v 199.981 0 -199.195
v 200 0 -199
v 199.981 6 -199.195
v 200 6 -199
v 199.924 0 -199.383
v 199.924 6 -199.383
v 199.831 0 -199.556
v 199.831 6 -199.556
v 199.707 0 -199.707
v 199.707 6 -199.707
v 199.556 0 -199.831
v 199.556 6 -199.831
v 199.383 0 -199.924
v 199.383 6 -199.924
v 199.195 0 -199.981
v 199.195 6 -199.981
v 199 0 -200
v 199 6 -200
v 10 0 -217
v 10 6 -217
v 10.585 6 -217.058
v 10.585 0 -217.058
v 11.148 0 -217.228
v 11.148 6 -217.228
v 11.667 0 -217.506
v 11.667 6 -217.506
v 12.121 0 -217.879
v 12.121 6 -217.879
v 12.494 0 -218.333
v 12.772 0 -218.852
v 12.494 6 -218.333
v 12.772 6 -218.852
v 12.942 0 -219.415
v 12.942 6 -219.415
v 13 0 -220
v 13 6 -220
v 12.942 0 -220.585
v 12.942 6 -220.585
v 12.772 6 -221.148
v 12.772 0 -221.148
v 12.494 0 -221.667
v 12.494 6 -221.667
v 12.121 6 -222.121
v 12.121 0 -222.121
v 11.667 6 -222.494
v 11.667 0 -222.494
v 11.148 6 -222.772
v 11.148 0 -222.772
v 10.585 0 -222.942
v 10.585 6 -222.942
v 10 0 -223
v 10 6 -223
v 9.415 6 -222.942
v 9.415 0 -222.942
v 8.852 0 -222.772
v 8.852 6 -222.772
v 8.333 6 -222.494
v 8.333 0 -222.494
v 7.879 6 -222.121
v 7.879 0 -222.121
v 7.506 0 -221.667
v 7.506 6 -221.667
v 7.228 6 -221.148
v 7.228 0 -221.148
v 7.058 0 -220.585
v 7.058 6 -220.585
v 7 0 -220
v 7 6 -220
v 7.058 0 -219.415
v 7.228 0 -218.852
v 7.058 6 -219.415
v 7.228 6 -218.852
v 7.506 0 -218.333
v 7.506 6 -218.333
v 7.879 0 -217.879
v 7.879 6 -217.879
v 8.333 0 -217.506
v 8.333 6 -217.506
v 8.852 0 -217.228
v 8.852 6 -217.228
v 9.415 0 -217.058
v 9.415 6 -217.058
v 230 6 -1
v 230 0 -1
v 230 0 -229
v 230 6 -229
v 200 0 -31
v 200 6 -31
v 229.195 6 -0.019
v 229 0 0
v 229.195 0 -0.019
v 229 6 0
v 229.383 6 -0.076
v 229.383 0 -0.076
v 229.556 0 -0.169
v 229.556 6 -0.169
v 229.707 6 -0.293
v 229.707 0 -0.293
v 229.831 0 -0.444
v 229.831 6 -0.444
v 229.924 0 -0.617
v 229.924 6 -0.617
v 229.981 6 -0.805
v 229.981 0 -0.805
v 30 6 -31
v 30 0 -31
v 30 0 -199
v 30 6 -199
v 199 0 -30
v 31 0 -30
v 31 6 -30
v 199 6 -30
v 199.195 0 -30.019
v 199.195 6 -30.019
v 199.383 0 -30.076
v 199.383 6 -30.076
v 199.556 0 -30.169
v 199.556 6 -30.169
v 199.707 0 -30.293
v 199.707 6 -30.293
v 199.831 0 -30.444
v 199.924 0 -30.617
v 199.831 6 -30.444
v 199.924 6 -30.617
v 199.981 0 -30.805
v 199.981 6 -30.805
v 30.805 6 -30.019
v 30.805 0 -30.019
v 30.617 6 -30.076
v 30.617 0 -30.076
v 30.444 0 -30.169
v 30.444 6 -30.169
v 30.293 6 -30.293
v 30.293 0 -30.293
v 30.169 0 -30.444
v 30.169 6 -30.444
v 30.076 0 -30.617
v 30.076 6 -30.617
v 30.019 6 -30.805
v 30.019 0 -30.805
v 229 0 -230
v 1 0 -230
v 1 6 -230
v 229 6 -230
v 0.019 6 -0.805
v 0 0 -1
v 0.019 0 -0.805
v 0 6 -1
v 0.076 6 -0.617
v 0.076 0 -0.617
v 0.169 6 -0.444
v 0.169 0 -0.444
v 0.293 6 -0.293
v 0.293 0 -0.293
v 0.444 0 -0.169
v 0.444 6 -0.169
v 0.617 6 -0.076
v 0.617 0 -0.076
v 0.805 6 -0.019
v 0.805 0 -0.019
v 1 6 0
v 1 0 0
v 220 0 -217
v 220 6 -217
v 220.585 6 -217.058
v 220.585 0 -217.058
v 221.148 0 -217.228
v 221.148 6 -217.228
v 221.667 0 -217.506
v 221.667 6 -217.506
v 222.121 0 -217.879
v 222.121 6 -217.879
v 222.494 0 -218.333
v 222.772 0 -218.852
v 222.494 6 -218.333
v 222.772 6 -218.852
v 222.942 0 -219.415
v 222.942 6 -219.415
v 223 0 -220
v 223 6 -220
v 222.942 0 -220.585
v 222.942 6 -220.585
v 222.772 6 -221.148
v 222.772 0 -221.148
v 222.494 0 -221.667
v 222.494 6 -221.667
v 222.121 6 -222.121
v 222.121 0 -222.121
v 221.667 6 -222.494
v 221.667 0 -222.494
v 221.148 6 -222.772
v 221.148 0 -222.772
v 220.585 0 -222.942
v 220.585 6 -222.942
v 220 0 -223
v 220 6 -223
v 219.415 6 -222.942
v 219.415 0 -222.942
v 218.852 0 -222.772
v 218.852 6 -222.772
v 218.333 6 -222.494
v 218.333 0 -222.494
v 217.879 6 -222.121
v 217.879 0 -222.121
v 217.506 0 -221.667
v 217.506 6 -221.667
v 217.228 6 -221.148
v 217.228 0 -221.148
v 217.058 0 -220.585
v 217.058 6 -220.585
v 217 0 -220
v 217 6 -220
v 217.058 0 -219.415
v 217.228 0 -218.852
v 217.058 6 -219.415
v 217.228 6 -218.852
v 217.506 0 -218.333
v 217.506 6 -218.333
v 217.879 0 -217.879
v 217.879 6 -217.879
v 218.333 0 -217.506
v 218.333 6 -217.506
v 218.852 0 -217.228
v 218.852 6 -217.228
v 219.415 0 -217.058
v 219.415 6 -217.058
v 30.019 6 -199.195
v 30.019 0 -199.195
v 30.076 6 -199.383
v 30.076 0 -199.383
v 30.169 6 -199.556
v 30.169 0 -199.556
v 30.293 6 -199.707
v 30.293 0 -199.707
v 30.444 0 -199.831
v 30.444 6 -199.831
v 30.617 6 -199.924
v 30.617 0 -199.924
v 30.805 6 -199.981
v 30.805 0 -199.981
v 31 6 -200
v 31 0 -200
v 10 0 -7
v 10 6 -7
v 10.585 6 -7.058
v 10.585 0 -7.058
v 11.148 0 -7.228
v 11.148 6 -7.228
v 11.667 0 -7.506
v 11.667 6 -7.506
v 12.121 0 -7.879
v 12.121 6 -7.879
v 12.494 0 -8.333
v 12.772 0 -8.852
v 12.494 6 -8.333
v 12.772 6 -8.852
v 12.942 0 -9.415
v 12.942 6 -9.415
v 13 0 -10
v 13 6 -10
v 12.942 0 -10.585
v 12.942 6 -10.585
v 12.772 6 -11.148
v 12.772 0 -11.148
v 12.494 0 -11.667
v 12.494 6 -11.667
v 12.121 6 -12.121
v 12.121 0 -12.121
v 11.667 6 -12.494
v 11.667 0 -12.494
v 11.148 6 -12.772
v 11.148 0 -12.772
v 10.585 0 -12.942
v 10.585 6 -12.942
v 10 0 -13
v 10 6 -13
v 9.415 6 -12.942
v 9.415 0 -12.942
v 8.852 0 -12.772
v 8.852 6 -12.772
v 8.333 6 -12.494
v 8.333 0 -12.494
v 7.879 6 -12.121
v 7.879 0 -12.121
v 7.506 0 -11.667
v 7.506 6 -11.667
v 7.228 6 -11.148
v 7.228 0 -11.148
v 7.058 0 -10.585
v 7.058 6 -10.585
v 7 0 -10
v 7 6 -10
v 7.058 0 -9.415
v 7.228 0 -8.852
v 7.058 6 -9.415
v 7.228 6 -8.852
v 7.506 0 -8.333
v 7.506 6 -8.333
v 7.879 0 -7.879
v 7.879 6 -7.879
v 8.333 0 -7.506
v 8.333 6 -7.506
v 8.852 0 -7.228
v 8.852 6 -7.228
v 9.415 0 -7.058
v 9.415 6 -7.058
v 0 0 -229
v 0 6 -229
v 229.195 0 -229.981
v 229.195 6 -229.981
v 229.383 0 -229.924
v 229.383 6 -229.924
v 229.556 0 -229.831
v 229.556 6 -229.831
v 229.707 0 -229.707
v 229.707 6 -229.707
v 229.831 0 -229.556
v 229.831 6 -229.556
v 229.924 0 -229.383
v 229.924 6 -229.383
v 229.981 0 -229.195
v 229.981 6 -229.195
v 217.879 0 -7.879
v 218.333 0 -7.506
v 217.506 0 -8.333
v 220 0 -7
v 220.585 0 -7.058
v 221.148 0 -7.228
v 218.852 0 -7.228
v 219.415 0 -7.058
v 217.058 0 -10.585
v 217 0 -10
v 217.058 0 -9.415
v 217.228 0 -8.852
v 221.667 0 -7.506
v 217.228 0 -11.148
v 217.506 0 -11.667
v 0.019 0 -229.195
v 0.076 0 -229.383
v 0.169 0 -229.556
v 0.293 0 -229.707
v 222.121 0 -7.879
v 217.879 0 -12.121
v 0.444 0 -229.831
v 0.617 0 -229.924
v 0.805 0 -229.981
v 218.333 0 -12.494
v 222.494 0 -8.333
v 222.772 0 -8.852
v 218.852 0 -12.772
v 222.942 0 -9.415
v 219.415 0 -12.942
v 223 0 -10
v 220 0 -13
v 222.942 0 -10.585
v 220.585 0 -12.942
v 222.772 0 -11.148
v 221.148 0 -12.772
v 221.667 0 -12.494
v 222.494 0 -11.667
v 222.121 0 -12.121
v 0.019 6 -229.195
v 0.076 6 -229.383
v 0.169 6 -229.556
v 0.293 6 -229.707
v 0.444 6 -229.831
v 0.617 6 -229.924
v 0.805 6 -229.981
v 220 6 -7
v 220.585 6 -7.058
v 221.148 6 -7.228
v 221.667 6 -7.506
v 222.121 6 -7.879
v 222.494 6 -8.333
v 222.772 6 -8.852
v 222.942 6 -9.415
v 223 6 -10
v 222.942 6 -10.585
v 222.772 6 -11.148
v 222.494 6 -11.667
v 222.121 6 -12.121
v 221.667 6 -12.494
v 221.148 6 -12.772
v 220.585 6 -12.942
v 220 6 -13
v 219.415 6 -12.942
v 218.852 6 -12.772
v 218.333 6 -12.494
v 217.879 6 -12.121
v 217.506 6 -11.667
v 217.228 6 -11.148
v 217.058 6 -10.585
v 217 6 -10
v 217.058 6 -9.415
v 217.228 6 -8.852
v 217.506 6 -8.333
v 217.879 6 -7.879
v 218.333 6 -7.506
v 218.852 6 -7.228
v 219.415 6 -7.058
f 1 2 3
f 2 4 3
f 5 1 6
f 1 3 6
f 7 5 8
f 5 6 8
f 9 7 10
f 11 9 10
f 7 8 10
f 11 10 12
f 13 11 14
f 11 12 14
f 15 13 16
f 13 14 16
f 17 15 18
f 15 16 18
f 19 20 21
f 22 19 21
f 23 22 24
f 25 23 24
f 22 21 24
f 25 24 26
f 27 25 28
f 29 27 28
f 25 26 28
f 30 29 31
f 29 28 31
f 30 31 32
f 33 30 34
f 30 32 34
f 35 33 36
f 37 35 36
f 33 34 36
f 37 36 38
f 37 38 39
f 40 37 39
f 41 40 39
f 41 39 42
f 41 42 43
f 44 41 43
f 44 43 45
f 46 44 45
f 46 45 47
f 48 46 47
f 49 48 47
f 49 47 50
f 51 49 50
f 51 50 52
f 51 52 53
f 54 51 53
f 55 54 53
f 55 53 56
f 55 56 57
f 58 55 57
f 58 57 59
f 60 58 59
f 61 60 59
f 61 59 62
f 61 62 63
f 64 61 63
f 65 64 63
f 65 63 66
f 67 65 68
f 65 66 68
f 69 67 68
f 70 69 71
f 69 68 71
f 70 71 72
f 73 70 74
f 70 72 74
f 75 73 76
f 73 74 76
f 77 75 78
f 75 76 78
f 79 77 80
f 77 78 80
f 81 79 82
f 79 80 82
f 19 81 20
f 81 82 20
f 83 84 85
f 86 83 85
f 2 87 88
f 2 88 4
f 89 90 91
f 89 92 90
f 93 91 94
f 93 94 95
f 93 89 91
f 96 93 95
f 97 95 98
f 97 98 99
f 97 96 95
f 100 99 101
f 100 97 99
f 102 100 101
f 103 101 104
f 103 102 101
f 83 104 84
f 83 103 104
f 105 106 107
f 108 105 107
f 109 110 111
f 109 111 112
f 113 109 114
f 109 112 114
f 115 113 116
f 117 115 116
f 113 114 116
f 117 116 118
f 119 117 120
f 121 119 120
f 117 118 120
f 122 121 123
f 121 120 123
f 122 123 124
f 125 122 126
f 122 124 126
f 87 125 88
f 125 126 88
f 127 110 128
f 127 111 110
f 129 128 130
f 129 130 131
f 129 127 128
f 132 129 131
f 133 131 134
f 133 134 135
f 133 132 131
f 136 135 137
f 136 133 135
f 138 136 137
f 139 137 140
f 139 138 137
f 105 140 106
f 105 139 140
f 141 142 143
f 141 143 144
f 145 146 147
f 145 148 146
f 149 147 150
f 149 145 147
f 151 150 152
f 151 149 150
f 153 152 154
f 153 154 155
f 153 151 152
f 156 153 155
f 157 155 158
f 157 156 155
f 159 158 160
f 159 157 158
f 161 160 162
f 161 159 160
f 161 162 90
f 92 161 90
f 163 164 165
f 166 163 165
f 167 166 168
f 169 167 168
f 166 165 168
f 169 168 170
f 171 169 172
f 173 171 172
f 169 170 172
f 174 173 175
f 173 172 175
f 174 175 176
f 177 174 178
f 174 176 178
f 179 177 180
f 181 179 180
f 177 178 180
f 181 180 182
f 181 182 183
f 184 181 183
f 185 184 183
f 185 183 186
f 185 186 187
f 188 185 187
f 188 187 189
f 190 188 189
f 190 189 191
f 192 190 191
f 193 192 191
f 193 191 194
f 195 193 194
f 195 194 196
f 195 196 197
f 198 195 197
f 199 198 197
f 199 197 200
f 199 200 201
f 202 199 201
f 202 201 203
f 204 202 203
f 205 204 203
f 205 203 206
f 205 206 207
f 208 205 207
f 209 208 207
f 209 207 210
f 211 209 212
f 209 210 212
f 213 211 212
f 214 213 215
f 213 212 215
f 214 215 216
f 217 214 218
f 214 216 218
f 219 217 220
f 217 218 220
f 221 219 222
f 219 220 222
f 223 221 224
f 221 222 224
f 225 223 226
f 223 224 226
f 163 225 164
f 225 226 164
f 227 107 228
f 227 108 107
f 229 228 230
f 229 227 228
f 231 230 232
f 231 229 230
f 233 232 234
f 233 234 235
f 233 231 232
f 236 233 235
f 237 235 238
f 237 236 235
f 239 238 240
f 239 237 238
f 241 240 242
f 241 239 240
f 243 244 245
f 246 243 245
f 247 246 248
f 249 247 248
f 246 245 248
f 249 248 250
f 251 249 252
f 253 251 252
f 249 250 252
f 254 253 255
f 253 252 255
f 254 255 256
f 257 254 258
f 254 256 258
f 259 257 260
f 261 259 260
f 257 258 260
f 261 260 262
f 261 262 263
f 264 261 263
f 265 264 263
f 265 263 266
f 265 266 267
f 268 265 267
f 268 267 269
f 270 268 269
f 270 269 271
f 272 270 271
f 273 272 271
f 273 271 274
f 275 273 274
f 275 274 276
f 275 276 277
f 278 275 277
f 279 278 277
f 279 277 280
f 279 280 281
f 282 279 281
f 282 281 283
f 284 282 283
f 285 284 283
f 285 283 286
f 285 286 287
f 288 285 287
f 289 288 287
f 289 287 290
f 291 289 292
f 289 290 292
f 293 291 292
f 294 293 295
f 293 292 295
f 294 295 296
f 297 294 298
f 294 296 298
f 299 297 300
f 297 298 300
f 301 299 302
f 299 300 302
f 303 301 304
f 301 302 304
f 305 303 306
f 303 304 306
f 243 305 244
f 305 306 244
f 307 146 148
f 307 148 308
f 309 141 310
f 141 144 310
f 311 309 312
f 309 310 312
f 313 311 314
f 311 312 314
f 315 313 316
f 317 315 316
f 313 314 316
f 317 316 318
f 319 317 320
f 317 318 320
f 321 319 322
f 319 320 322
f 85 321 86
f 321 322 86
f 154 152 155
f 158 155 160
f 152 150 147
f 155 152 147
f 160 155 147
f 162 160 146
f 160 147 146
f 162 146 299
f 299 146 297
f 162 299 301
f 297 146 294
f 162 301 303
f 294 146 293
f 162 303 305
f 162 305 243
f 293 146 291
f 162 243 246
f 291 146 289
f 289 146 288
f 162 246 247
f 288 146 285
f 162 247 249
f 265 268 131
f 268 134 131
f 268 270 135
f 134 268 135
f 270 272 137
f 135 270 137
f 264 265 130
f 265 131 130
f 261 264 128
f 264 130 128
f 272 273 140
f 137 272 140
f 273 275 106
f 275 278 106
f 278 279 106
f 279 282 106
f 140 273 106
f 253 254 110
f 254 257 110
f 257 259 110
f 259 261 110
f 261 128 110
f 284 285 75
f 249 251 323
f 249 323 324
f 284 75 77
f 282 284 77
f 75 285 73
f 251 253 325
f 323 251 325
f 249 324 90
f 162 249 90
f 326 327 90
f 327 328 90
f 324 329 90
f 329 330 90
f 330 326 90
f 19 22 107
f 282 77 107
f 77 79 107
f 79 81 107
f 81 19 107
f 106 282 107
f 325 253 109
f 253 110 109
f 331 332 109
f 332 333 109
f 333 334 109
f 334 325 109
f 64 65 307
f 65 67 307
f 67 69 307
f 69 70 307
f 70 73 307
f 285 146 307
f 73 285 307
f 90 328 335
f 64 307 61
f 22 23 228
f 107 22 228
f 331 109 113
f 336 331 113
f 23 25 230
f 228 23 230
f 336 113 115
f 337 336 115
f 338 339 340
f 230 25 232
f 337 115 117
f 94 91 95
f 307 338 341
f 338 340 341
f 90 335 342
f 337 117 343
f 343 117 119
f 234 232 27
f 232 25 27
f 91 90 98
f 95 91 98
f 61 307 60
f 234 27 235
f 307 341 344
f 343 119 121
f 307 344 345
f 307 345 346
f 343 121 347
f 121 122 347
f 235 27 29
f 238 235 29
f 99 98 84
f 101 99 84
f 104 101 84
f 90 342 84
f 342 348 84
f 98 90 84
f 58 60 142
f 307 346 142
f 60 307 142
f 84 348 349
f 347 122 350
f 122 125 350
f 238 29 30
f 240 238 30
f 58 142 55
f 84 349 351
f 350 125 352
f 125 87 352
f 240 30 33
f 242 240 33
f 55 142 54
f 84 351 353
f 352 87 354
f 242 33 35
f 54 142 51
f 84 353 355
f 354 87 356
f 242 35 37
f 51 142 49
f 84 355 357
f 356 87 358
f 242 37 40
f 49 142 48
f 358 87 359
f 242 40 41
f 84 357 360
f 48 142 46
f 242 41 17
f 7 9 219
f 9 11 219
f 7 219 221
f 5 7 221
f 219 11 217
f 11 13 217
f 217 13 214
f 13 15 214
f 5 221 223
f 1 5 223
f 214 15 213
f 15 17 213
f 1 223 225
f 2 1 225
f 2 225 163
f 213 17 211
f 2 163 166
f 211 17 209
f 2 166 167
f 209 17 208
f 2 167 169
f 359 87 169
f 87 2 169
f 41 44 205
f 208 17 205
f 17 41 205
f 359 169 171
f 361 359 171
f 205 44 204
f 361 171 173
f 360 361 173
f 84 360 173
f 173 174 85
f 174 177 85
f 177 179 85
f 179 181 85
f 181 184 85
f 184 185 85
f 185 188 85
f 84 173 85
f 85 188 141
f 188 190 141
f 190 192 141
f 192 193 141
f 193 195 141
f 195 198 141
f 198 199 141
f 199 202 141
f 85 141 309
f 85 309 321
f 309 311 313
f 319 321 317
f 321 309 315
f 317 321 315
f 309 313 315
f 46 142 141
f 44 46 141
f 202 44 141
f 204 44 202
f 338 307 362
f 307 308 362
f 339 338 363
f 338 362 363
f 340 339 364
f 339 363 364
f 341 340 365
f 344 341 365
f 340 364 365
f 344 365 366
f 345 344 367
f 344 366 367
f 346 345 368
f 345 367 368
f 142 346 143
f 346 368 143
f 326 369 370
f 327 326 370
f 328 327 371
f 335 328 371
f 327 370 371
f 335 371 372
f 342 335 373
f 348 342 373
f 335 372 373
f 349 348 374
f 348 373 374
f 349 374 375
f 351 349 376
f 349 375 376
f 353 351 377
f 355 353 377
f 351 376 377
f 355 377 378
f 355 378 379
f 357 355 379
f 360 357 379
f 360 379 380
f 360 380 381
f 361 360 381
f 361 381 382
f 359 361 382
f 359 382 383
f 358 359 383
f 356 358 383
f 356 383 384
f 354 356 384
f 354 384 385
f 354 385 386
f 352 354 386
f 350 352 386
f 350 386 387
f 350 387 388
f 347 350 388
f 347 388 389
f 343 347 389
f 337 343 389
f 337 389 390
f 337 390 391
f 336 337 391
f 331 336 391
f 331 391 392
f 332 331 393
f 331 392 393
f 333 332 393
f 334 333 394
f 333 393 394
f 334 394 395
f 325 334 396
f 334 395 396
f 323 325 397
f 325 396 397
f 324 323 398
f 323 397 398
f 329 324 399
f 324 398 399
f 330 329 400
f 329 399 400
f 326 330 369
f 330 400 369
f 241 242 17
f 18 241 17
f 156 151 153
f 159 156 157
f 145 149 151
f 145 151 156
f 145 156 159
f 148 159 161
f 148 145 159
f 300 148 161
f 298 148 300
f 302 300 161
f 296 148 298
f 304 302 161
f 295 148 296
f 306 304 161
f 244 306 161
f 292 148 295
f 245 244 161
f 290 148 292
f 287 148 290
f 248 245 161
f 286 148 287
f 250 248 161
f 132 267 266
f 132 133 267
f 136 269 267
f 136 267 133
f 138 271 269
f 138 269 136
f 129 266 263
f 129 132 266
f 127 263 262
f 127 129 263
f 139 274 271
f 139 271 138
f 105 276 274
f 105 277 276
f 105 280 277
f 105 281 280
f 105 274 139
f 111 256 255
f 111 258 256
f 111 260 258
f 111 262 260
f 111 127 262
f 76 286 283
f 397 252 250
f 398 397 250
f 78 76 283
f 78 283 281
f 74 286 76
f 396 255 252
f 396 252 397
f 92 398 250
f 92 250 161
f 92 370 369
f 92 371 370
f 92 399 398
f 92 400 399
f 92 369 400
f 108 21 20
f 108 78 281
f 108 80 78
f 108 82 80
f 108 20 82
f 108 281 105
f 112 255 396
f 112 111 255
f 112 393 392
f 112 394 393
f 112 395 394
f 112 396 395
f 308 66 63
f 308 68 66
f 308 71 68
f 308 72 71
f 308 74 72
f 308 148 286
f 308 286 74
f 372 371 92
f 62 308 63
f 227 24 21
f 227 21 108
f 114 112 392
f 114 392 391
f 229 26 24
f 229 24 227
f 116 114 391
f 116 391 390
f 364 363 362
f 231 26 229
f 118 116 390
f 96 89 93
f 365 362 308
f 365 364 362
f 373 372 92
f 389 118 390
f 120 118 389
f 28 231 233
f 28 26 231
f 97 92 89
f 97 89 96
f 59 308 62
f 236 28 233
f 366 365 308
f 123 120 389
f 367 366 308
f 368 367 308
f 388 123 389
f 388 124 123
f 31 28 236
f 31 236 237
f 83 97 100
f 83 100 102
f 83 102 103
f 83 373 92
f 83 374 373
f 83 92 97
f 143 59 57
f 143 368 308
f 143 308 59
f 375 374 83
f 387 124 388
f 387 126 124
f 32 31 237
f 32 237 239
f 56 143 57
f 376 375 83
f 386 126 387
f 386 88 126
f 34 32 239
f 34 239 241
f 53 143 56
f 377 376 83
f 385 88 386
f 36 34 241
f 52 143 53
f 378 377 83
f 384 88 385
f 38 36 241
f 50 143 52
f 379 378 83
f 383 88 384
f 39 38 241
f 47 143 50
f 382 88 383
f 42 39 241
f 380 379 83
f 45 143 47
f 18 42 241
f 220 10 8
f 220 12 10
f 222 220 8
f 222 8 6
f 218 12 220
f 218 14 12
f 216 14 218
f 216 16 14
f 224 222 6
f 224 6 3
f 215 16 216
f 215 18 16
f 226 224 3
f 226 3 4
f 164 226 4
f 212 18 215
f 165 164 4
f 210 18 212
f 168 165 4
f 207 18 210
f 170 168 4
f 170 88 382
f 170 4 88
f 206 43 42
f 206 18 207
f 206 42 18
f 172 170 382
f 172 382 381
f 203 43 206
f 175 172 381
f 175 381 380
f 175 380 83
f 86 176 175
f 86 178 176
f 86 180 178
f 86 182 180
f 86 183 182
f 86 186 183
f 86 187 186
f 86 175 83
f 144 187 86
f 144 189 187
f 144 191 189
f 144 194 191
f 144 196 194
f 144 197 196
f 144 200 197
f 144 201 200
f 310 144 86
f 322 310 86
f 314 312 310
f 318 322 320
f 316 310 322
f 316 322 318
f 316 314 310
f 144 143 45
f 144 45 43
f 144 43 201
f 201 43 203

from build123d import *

# Parameters (mm, degrees)
SKETCH1_W          = 230
SKETCH1_H          = 230
SKETCH1_W_2        = 170
SKETCH1_H_2        = 170
BORDER_DEPTH       = 6
SKETCH2_R          = 3
CUT_EXTRUDE1_DEPTH = 326.324453431
FILLET1_R          = 1


with BuildPart() as part:
    # Sketch1 → border (new body)
    with BuildSketch(Plane(origin=(0, 0, 0), x_dir=(1, 0, 0), z_dir=(0, 1, 0))):
        with Locations((115, 115)):
            Rectangle(SKETCH1_W, SKETCH1_H)
        with Locations((115, 115)):
            Rectangle(SKETCH1_W_2, SKETCH1_H_2, mode=Mode.SUBTRACT)
    extrude(amount=BORDER_DEPTH)

    # Sketch2 → Cut-Extrude1 (cut, through all)
    with BuildSketch(Plane(origin=(0, 6, 0), x_dir=(1, 0, 0), z_dir=(0, 1, 0))):
        with Locations(Location((10, 220, 0), (0, 0, 270))):
            Circle(SKETCH2_R)
        with Locations(Location((220, 220, 0), (0, 0, 270))):
            Circle(SKETCH2_R)
        with Locations(Location((220, 10, 0), (0, 0, 270))):
            Circle(SKETCH2_R)
        with Locations(Location((10, 10, 0), (0, 0, 270))):
            Circle(SKETCH2_R)
    extrude(amount=-CUT_EXTRUDE1_DEPTH, mode=Mode.SUBTRACT)

    # Fillet1
    fillet1_edges = [part.edges().sort_by_distance(p)[0] for p in [
        (30, 3, -200),
        (30, 3, -30),
        (200, 3, -30),
        (200, 3, -200),
        (0, 3, -230),
        (230, 3, -230),
        (230, 3, 0),
        (0, 3, 0),
    ]]
    fillet(fillet1_edges, radius=FILLET1_R)


solid = part.part
